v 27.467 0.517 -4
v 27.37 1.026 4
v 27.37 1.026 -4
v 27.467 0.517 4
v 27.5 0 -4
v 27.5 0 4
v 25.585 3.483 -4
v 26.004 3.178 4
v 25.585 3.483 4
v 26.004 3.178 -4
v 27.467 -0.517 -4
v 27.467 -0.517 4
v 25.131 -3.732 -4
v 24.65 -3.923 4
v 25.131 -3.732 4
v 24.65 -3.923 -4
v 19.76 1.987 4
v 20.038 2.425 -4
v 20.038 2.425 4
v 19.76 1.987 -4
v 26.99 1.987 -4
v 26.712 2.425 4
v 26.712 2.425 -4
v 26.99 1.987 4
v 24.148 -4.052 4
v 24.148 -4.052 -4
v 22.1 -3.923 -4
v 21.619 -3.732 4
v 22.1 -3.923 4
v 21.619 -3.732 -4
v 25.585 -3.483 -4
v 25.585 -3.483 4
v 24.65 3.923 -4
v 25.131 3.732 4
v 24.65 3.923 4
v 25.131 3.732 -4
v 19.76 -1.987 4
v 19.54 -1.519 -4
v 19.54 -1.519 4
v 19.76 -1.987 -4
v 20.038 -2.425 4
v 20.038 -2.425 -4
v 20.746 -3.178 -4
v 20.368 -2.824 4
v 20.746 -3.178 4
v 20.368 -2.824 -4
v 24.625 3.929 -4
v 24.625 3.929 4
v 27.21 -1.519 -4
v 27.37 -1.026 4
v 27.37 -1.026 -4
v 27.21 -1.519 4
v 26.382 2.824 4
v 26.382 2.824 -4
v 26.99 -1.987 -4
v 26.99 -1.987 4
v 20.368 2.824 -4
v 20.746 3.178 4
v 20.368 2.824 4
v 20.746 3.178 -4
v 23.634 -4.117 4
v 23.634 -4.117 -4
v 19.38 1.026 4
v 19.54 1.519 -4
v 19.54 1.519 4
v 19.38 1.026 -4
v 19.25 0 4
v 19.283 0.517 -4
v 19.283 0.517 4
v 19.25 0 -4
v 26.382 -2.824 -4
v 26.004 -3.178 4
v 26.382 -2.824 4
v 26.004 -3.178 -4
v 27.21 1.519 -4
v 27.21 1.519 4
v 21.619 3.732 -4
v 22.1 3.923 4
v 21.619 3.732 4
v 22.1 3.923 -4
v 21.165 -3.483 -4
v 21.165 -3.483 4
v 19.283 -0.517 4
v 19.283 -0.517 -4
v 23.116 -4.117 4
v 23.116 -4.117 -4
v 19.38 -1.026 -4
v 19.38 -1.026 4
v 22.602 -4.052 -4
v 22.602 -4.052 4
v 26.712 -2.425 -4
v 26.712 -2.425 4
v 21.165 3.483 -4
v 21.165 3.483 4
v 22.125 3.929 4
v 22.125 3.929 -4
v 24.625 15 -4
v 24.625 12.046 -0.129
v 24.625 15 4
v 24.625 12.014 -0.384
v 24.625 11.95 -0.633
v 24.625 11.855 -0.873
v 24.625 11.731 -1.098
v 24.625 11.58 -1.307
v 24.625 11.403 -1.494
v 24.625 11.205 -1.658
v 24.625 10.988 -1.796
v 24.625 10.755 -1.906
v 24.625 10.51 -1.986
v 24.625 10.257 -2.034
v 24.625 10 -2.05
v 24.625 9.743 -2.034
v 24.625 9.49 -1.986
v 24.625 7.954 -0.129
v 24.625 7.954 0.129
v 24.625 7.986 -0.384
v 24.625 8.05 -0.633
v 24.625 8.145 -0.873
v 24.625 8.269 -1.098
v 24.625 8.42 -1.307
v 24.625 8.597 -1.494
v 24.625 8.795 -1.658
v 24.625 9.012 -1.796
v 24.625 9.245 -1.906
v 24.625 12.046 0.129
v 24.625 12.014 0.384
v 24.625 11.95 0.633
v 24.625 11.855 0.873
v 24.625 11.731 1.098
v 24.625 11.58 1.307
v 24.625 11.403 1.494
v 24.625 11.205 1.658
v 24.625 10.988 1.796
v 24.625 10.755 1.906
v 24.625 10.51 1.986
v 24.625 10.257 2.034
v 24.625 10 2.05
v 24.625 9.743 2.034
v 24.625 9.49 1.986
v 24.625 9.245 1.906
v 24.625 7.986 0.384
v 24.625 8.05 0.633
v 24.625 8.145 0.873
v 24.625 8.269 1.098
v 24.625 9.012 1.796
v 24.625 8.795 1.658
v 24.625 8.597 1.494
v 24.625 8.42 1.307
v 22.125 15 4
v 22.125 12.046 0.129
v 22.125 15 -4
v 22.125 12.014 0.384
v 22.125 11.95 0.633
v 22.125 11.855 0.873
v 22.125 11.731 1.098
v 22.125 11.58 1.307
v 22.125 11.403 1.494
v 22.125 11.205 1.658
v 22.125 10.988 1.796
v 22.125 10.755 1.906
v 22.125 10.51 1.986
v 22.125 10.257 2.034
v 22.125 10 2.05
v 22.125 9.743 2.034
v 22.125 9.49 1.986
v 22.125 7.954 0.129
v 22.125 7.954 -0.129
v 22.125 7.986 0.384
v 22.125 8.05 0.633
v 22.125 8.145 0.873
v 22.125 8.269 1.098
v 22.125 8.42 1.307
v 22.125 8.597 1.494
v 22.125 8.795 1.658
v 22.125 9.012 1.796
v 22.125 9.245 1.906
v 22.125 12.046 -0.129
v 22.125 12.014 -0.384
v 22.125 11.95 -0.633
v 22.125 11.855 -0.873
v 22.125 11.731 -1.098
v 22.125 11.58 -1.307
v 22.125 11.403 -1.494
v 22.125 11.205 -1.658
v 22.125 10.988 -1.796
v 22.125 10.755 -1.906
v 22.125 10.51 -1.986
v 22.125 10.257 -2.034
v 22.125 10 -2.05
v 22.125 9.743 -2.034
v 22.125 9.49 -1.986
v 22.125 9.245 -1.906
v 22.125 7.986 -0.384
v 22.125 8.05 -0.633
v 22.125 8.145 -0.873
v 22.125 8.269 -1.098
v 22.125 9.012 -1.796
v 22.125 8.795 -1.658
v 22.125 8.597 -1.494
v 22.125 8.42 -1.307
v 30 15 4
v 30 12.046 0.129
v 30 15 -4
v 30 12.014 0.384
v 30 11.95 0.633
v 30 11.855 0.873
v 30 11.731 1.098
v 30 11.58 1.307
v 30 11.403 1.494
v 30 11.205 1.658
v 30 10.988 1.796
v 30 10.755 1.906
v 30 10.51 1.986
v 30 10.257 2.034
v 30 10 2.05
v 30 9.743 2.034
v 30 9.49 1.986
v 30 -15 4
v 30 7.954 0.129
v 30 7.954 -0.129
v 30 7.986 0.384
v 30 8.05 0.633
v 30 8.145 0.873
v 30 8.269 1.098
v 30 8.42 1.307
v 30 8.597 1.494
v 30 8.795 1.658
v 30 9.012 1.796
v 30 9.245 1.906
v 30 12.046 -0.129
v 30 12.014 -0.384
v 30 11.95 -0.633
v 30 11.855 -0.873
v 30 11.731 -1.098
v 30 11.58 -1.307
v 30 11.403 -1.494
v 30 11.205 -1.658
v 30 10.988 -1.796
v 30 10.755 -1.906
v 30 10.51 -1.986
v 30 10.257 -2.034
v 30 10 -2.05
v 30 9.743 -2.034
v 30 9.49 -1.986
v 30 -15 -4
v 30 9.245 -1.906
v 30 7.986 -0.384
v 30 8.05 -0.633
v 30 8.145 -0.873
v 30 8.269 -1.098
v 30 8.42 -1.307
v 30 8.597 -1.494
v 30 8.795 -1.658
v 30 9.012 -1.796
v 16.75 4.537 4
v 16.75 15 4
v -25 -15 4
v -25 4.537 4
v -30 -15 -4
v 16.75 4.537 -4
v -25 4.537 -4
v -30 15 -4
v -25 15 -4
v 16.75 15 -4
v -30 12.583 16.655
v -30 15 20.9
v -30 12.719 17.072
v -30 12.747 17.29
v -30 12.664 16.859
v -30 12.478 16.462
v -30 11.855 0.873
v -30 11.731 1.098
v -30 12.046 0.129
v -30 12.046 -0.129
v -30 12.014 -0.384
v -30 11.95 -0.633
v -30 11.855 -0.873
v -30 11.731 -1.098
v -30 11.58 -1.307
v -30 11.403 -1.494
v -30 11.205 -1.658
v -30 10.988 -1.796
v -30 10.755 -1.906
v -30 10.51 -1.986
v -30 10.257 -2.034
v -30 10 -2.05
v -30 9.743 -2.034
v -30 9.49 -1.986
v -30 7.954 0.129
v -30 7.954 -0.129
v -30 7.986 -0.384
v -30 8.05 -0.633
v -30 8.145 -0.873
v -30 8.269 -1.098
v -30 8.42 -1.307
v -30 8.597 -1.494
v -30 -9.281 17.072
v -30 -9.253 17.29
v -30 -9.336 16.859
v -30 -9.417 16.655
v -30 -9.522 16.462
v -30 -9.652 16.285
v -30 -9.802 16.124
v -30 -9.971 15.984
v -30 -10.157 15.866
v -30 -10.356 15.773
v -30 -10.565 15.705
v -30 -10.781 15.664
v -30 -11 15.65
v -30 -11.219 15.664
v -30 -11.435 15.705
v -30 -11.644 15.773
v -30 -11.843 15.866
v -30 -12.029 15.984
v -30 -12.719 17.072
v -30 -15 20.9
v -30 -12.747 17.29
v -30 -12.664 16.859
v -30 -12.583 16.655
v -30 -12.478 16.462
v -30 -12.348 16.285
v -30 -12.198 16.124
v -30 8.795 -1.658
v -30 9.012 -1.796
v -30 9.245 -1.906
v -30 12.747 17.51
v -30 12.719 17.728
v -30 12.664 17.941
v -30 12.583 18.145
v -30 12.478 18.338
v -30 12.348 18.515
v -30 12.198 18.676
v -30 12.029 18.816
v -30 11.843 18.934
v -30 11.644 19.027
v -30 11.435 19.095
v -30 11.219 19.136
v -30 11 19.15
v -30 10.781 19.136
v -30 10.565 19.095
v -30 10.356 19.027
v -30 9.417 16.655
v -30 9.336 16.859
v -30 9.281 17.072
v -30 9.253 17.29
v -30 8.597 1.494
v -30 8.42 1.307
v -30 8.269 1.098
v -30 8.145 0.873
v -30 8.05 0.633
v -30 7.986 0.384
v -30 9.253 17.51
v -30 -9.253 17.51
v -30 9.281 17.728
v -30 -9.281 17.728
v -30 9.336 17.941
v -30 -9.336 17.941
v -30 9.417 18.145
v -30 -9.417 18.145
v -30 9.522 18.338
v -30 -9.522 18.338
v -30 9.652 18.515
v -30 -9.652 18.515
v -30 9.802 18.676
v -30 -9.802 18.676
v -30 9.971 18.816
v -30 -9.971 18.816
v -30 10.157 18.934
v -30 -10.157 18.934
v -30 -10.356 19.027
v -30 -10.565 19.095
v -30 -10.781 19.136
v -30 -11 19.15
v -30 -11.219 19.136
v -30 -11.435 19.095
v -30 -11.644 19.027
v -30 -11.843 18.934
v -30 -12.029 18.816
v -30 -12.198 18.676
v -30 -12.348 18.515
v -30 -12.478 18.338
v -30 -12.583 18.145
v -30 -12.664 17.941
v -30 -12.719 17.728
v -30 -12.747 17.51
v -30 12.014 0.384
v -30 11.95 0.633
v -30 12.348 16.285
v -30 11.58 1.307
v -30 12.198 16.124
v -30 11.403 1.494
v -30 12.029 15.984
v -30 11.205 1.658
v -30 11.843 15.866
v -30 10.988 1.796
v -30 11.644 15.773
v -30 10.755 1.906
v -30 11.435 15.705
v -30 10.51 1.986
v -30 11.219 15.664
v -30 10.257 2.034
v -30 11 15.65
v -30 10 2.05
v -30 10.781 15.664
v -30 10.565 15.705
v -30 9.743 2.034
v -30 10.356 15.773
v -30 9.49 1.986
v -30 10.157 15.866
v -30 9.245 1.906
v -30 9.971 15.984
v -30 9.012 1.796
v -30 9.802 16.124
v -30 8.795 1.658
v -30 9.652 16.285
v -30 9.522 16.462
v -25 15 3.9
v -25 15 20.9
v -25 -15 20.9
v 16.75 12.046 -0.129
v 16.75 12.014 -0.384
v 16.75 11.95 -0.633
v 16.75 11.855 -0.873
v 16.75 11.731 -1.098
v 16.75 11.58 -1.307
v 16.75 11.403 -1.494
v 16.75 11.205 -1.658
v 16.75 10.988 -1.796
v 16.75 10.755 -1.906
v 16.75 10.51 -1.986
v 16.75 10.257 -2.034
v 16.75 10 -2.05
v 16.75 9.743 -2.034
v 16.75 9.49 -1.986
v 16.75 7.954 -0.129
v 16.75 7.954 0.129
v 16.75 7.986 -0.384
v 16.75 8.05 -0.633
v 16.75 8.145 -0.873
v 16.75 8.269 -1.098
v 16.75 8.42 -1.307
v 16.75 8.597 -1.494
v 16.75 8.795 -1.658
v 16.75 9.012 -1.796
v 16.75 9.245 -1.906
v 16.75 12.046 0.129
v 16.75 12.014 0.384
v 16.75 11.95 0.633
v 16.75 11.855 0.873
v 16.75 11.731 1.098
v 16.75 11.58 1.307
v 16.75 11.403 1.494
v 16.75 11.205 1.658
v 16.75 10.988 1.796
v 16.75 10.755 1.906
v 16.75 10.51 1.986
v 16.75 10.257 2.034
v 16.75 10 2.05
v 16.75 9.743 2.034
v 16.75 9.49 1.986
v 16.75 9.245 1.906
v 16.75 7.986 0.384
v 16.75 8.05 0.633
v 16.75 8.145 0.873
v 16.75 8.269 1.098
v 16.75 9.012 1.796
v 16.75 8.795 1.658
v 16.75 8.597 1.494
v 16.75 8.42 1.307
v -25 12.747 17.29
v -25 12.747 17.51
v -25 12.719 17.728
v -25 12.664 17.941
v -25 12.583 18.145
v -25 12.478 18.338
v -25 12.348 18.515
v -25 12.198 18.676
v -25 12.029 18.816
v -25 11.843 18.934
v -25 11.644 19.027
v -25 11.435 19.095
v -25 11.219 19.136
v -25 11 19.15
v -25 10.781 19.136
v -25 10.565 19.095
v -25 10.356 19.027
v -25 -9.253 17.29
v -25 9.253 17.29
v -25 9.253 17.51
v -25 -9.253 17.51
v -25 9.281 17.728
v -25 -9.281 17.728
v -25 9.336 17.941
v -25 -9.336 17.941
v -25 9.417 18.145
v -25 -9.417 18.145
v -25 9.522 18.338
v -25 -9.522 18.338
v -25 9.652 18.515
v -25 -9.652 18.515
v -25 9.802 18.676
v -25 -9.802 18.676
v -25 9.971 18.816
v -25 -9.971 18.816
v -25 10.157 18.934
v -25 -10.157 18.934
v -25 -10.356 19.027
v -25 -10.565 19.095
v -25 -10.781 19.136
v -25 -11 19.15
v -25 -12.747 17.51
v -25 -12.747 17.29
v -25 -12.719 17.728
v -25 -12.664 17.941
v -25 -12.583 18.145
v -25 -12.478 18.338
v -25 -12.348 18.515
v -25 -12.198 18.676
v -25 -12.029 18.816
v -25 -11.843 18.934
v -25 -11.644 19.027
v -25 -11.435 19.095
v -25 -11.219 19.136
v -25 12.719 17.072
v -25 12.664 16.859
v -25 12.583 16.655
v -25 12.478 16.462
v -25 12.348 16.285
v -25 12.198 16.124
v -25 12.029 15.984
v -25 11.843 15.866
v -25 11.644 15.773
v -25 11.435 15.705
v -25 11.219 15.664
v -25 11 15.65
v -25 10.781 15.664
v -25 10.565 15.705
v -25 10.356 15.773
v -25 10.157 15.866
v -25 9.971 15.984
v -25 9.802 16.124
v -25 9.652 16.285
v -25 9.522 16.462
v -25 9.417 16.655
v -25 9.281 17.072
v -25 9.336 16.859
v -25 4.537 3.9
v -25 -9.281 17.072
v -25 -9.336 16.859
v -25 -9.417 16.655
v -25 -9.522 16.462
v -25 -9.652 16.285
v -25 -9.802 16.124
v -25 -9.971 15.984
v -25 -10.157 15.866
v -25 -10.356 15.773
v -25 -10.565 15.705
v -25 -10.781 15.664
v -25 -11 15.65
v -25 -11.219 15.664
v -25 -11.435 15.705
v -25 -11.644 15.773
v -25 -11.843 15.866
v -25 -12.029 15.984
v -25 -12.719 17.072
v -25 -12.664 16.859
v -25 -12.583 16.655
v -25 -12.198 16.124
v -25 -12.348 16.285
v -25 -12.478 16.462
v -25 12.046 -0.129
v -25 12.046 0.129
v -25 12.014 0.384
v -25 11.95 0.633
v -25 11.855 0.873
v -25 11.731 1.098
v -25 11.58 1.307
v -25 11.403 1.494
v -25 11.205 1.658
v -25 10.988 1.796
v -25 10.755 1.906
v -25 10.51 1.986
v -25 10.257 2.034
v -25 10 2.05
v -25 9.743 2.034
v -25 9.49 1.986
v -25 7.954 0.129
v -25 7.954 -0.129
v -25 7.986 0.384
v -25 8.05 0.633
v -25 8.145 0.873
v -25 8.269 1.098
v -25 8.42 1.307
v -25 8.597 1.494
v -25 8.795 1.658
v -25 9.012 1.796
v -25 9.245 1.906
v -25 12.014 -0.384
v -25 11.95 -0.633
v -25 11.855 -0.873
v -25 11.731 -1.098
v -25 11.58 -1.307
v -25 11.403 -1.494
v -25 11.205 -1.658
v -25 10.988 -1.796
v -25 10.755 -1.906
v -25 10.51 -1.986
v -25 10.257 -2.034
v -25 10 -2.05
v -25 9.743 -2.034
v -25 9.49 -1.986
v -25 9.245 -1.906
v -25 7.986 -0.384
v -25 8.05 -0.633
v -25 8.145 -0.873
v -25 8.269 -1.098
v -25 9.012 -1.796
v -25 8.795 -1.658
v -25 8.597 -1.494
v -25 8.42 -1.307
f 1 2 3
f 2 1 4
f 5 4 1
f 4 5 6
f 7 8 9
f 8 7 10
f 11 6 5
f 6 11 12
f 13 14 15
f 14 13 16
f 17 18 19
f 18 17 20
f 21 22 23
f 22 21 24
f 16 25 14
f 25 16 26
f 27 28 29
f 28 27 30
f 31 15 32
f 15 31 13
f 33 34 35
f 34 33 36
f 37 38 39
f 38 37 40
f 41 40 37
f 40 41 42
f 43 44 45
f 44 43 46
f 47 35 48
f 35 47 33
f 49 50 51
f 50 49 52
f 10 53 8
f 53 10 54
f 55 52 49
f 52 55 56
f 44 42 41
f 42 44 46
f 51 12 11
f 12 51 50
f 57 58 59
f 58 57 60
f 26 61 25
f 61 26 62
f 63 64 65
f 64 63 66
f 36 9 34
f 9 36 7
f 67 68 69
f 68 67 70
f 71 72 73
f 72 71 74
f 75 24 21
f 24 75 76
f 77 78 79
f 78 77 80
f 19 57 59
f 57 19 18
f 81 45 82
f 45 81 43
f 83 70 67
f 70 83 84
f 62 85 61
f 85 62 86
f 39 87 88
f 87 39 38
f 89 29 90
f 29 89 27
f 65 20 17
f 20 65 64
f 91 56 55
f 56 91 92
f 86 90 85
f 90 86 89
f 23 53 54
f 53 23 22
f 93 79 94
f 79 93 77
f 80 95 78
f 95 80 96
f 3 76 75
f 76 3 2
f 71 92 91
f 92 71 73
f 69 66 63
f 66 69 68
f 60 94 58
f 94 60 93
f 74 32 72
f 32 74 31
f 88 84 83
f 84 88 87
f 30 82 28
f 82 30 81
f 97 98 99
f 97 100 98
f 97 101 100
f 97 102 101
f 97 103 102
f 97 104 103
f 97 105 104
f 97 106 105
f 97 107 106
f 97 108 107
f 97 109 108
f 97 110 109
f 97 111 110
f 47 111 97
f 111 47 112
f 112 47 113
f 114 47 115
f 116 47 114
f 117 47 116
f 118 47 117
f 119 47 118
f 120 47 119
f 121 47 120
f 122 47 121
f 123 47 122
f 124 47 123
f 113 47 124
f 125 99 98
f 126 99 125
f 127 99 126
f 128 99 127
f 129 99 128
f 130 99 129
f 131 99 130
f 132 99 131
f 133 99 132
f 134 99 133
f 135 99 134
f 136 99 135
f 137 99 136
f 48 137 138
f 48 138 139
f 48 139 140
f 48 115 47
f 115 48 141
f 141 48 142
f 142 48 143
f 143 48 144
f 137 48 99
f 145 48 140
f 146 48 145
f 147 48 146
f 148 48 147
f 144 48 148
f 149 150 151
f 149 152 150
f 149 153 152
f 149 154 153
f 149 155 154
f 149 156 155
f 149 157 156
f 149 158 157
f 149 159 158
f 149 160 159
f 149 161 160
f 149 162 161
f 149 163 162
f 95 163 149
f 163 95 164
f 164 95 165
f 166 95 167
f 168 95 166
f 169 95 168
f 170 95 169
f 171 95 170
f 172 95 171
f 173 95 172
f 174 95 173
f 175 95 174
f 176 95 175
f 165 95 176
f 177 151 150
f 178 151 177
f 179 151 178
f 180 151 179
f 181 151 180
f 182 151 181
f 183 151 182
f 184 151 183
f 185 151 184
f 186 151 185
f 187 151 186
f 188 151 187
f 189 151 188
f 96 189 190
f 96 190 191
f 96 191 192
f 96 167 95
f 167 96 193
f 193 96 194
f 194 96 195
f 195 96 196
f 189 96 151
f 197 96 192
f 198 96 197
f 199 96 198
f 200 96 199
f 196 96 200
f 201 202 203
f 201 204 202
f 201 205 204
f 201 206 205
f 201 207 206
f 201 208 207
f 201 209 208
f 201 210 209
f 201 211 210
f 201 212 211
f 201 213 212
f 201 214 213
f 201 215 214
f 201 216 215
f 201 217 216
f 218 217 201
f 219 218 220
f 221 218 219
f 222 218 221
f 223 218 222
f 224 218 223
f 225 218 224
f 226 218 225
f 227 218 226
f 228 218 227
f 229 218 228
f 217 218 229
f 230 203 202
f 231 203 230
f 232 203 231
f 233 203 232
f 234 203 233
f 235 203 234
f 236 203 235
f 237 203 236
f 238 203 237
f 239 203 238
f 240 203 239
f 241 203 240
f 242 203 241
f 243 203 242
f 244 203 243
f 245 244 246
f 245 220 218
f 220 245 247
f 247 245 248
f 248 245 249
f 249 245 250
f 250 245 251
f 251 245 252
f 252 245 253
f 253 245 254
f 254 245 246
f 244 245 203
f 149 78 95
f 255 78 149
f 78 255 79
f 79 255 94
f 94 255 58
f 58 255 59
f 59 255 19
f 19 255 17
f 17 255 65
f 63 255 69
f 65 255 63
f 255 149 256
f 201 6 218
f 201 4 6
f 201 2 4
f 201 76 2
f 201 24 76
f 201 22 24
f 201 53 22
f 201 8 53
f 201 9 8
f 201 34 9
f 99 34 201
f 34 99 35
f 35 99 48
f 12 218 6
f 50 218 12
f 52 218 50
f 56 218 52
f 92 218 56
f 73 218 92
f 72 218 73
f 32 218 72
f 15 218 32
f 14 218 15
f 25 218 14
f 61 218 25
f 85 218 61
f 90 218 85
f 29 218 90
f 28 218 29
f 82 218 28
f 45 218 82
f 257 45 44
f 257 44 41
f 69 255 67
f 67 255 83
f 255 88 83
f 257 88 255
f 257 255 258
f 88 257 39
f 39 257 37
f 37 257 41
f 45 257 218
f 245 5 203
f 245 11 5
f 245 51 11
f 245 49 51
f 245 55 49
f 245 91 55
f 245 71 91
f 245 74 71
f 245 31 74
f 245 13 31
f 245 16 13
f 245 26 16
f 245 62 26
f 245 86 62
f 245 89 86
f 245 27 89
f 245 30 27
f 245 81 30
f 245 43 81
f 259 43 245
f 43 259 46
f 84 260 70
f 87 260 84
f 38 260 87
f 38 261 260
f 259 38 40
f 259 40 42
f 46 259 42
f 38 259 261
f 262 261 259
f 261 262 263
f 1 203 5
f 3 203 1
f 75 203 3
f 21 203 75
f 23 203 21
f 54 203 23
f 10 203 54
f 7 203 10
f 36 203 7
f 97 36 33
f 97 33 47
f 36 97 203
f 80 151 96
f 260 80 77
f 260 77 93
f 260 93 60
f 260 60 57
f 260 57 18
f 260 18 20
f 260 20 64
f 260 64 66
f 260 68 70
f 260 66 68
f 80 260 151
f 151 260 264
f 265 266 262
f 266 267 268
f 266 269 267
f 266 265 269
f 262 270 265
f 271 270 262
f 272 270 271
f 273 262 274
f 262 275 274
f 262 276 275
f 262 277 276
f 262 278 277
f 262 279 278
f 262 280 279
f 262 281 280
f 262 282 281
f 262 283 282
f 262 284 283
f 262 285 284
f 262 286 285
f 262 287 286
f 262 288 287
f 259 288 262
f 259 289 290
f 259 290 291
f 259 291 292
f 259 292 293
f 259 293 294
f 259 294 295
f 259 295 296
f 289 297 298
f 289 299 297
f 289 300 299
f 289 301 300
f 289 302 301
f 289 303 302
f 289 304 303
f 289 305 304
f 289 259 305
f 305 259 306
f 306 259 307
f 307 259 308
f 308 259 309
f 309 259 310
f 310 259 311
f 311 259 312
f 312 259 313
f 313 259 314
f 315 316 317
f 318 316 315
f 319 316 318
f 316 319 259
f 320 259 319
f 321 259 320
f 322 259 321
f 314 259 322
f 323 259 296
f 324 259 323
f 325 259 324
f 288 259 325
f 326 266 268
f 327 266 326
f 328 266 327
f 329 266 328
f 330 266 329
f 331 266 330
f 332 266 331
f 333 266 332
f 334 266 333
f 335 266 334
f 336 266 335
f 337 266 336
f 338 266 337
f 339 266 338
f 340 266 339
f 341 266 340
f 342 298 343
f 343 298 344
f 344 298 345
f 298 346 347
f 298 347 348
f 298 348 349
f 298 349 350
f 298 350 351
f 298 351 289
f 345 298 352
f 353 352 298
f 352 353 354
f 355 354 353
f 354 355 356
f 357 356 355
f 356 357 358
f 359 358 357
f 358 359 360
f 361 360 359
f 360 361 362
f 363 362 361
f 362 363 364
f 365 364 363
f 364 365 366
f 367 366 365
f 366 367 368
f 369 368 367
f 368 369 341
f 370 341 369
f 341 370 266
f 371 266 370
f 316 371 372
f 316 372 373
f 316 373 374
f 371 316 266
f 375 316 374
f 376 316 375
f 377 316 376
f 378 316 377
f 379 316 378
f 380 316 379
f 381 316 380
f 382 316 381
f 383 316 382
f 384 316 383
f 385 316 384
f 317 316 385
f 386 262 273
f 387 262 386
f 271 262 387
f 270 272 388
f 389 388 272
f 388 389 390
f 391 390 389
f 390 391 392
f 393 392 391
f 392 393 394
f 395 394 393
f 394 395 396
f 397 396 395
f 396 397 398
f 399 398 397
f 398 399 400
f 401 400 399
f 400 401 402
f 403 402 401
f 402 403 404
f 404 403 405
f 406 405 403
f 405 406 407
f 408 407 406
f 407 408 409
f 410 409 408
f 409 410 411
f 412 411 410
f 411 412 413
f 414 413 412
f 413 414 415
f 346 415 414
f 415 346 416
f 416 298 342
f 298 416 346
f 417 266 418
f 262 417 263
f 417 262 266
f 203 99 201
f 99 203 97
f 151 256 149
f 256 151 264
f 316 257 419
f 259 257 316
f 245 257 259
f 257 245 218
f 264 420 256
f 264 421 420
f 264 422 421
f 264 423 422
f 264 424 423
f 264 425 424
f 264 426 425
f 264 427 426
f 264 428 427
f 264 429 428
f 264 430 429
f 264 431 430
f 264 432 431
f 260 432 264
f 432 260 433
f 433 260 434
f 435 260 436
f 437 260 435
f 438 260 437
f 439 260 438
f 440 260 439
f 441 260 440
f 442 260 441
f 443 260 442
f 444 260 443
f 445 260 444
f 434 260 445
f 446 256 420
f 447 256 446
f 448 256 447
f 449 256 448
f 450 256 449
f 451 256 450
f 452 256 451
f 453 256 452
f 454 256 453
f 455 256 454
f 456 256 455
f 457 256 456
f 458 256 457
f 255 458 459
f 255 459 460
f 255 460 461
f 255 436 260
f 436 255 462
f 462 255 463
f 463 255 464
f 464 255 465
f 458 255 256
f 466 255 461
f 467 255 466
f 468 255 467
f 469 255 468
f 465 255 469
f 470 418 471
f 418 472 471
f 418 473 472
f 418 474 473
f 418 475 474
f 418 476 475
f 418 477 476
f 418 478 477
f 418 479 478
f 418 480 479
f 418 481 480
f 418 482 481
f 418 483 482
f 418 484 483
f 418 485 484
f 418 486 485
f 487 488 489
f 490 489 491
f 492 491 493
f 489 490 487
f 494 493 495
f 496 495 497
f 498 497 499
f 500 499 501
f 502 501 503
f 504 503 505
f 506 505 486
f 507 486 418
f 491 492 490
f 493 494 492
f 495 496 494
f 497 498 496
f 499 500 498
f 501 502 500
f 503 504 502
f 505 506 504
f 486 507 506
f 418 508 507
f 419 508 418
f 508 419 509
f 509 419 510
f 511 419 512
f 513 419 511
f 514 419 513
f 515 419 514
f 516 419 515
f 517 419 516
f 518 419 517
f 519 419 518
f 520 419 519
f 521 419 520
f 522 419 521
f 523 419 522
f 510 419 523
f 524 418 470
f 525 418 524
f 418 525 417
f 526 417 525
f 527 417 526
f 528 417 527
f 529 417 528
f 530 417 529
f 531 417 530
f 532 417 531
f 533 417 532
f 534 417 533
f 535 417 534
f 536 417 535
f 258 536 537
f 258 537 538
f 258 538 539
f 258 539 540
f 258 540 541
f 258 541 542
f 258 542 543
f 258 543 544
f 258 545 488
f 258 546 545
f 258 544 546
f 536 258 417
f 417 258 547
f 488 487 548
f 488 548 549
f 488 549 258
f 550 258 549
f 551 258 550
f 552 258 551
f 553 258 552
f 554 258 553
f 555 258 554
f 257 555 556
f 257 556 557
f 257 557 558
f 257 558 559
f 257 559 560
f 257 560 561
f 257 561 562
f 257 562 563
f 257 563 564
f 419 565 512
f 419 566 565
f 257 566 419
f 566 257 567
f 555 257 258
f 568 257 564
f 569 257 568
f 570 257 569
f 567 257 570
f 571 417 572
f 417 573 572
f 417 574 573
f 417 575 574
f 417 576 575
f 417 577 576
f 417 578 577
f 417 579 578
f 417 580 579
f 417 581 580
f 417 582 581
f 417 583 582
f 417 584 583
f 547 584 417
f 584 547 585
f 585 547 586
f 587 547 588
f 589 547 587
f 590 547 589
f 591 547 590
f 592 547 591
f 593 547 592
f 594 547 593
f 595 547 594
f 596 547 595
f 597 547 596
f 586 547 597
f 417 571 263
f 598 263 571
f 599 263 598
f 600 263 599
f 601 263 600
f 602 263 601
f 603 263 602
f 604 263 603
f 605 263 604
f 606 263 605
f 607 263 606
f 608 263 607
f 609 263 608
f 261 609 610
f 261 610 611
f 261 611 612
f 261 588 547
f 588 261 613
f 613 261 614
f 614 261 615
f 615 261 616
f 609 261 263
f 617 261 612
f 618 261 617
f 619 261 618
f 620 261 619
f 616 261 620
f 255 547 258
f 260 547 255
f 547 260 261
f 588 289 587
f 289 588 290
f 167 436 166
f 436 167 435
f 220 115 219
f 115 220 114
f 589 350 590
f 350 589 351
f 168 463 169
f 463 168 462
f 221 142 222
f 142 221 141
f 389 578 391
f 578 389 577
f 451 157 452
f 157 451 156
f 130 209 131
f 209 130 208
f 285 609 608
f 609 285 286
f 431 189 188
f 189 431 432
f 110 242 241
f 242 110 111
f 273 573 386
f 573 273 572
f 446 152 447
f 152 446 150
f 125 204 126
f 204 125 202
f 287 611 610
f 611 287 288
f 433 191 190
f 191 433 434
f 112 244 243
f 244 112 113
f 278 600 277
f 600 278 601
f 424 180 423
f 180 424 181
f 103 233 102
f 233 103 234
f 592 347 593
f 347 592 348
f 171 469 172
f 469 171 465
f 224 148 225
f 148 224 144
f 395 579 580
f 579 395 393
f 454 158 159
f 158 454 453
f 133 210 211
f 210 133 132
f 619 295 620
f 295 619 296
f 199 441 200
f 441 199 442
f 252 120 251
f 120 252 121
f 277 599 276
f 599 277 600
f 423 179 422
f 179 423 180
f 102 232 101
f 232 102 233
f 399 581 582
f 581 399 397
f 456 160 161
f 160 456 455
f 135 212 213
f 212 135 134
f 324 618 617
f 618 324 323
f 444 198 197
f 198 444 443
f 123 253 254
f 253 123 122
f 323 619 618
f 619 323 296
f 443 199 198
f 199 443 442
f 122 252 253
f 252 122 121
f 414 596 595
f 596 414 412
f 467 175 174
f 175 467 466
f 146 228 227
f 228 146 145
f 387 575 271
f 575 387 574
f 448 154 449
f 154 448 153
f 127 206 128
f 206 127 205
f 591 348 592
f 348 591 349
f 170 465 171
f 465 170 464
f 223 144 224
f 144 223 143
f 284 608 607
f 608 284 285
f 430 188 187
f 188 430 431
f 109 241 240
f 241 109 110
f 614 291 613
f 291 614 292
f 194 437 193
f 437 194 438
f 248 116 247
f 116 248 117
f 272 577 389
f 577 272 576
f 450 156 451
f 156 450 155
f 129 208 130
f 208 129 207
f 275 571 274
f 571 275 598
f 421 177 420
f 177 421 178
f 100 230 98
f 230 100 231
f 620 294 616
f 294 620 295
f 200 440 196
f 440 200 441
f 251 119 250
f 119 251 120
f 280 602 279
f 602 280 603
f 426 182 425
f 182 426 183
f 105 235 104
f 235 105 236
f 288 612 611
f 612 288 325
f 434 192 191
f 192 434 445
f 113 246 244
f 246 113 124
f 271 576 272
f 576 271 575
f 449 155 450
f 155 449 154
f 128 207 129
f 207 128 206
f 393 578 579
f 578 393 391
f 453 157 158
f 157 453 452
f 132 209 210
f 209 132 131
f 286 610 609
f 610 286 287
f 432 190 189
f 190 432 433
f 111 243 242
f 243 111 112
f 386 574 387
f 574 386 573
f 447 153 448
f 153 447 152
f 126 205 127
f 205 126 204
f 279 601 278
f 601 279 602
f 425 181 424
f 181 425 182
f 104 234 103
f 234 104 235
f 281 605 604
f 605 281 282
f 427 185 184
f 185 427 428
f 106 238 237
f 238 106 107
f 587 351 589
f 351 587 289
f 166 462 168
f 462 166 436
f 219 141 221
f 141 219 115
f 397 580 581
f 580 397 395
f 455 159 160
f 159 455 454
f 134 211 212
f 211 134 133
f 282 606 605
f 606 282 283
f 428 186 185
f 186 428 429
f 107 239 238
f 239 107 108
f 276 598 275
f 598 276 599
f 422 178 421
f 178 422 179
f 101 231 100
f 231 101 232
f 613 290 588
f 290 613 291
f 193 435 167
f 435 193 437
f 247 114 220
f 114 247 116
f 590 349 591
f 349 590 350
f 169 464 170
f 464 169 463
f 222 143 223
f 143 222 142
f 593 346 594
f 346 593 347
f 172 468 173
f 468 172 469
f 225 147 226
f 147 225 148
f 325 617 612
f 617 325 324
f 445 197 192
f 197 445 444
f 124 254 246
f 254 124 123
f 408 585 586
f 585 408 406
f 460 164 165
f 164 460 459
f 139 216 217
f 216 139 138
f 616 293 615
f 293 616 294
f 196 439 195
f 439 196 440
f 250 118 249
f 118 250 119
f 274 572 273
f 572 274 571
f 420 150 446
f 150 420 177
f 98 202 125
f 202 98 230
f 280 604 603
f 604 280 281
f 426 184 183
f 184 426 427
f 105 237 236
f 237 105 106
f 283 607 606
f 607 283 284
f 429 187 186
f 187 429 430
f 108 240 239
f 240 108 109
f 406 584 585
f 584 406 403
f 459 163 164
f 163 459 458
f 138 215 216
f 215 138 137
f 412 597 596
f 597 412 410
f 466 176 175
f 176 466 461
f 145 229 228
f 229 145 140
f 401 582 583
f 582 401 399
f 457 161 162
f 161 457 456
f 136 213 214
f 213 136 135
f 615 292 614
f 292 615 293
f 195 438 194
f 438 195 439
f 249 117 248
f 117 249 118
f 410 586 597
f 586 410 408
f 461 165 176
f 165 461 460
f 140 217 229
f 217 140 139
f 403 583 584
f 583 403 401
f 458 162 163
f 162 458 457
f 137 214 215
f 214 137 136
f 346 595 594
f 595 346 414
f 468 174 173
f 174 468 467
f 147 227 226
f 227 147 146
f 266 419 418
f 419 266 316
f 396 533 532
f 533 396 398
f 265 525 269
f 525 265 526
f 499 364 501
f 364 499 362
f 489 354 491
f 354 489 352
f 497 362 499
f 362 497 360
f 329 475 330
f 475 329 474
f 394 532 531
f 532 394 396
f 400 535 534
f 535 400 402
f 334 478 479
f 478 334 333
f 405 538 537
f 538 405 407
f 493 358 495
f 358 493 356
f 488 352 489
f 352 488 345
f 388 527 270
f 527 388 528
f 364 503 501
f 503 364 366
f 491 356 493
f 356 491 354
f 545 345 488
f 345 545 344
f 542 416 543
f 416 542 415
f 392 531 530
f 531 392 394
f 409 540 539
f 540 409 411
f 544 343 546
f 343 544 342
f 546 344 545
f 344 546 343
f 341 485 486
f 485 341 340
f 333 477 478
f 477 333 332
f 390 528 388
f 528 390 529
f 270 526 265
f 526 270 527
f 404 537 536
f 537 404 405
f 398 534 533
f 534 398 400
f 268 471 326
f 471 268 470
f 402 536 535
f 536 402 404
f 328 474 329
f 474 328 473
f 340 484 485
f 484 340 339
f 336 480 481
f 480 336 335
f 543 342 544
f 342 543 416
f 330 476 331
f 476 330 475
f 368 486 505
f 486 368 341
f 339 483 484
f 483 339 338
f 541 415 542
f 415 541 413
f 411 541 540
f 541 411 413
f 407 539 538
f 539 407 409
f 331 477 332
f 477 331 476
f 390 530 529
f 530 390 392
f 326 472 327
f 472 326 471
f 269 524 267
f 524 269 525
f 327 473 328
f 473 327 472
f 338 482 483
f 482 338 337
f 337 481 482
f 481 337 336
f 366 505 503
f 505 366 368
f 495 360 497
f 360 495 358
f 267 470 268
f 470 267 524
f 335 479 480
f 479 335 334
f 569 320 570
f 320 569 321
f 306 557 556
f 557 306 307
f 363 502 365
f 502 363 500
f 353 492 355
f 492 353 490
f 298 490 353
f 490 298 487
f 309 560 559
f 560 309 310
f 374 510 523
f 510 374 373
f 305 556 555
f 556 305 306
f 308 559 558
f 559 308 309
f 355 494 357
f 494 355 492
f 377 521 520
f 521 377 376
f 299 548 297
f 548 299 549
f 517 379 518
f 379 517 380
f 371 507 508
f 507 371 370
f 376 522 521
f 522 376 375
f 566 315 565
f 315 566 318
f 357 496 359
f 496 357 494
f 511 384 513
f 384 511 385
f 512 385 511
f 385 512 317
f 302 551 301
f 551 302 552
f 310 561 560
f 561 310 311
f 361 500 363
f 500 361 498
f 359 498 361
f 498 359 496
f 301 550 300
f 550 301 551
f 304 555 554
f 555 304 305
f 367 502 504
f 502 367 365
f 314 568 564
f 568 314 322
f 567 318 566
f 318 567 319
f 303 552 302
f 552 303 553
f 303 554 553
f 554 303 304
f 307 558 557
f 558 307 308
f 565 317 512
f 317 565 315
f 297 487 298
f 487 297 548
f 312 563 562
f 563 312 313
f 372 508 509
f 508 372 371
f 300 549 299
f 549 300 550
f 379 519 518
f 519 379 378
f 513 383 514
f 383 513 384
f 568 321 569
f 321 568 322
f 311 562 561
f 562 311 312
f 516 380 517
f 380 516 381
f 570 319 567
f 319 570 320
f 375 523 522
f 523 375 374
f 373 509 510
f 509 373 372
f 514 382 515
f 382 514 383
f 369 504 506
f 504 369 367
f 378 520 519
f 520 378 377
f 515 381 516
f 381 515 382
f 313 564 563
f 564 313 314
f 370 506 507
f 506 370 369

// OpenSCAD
$fn=50;

// screws for the mounting plate
screw_diameter = 3.5;
screw_distance = 22;

// size of the mounting plate
mount_width=5;
mount_thickness=12 + 20 - 15; // 12+20 goes below the extruder
mount_depth=30;

// holder plate
plate_thickness = 8;
plate_width=60;
plate_depth=30;

// clamp
hole_diameter = 8.25;  // dial indicator hole
clamp_diameter=4.1;   // screw hole for tightening the clamp
clamp_border_width = 2.5;
clamp_width = 5;
hole_space=2.5;         // space between the jaws


// Base plate
difference() {
    cutout_width = plate_width - mount_width - hole_diameter - clamp_width;
    
    cube([plate_width, plate_depth, plate_thickness], center=true);
    
    
    translate([-plate_width/2+cutout_width/2 + mount_width, plate_depth/2+(hole_diameter/2 * 1.1), 0])
    
    cube([cutout_width, plate_depth, plate_thickness+1], center=true);
    
    // dial indicator clamp hole
    translate([plate_width/2 - hole_diameter/2 - clamp_border_width, 0, 0]) {
        // hole
        cylinder(h=20, r=hole_diameter/2, center=true);
        
        // cutout
        translate([0,plate_depth/2,0])
        cube([hole_space, plate_depth, plate_thickness+1], center=true);        
    }

    // screw hole
    translate([0,plate_depth/3,0])
    rotate([0,90,0])
    cylinder(h=plate_width+1, r=clamp_diameter/2, center=true);

}

// Carriage mount
translate([-plate_width/2 + mount_width/2 , 0,plate_thickness/2+mount_thickness/2-0.1])
difference() {
    
    // mounting plate
    cube([mount_width, mount_depth, mount_thickness], center=true);

    // screw 1
    translate([0, screw_distance/2,mount_thickness/2 - screw_diameter])
    rotate([0,90,0])
    cylinder(r=screw_diameter/2, h=mount_width+1, center=true);
    
    // screw 2
    translate([0, -screw_distance/2,mount_thickness/2 - screw_diameter])
    rotate([0,90,0])
    cylinder(r=screw_diameter/2, h=mount_width+1, center=true);
    
}
